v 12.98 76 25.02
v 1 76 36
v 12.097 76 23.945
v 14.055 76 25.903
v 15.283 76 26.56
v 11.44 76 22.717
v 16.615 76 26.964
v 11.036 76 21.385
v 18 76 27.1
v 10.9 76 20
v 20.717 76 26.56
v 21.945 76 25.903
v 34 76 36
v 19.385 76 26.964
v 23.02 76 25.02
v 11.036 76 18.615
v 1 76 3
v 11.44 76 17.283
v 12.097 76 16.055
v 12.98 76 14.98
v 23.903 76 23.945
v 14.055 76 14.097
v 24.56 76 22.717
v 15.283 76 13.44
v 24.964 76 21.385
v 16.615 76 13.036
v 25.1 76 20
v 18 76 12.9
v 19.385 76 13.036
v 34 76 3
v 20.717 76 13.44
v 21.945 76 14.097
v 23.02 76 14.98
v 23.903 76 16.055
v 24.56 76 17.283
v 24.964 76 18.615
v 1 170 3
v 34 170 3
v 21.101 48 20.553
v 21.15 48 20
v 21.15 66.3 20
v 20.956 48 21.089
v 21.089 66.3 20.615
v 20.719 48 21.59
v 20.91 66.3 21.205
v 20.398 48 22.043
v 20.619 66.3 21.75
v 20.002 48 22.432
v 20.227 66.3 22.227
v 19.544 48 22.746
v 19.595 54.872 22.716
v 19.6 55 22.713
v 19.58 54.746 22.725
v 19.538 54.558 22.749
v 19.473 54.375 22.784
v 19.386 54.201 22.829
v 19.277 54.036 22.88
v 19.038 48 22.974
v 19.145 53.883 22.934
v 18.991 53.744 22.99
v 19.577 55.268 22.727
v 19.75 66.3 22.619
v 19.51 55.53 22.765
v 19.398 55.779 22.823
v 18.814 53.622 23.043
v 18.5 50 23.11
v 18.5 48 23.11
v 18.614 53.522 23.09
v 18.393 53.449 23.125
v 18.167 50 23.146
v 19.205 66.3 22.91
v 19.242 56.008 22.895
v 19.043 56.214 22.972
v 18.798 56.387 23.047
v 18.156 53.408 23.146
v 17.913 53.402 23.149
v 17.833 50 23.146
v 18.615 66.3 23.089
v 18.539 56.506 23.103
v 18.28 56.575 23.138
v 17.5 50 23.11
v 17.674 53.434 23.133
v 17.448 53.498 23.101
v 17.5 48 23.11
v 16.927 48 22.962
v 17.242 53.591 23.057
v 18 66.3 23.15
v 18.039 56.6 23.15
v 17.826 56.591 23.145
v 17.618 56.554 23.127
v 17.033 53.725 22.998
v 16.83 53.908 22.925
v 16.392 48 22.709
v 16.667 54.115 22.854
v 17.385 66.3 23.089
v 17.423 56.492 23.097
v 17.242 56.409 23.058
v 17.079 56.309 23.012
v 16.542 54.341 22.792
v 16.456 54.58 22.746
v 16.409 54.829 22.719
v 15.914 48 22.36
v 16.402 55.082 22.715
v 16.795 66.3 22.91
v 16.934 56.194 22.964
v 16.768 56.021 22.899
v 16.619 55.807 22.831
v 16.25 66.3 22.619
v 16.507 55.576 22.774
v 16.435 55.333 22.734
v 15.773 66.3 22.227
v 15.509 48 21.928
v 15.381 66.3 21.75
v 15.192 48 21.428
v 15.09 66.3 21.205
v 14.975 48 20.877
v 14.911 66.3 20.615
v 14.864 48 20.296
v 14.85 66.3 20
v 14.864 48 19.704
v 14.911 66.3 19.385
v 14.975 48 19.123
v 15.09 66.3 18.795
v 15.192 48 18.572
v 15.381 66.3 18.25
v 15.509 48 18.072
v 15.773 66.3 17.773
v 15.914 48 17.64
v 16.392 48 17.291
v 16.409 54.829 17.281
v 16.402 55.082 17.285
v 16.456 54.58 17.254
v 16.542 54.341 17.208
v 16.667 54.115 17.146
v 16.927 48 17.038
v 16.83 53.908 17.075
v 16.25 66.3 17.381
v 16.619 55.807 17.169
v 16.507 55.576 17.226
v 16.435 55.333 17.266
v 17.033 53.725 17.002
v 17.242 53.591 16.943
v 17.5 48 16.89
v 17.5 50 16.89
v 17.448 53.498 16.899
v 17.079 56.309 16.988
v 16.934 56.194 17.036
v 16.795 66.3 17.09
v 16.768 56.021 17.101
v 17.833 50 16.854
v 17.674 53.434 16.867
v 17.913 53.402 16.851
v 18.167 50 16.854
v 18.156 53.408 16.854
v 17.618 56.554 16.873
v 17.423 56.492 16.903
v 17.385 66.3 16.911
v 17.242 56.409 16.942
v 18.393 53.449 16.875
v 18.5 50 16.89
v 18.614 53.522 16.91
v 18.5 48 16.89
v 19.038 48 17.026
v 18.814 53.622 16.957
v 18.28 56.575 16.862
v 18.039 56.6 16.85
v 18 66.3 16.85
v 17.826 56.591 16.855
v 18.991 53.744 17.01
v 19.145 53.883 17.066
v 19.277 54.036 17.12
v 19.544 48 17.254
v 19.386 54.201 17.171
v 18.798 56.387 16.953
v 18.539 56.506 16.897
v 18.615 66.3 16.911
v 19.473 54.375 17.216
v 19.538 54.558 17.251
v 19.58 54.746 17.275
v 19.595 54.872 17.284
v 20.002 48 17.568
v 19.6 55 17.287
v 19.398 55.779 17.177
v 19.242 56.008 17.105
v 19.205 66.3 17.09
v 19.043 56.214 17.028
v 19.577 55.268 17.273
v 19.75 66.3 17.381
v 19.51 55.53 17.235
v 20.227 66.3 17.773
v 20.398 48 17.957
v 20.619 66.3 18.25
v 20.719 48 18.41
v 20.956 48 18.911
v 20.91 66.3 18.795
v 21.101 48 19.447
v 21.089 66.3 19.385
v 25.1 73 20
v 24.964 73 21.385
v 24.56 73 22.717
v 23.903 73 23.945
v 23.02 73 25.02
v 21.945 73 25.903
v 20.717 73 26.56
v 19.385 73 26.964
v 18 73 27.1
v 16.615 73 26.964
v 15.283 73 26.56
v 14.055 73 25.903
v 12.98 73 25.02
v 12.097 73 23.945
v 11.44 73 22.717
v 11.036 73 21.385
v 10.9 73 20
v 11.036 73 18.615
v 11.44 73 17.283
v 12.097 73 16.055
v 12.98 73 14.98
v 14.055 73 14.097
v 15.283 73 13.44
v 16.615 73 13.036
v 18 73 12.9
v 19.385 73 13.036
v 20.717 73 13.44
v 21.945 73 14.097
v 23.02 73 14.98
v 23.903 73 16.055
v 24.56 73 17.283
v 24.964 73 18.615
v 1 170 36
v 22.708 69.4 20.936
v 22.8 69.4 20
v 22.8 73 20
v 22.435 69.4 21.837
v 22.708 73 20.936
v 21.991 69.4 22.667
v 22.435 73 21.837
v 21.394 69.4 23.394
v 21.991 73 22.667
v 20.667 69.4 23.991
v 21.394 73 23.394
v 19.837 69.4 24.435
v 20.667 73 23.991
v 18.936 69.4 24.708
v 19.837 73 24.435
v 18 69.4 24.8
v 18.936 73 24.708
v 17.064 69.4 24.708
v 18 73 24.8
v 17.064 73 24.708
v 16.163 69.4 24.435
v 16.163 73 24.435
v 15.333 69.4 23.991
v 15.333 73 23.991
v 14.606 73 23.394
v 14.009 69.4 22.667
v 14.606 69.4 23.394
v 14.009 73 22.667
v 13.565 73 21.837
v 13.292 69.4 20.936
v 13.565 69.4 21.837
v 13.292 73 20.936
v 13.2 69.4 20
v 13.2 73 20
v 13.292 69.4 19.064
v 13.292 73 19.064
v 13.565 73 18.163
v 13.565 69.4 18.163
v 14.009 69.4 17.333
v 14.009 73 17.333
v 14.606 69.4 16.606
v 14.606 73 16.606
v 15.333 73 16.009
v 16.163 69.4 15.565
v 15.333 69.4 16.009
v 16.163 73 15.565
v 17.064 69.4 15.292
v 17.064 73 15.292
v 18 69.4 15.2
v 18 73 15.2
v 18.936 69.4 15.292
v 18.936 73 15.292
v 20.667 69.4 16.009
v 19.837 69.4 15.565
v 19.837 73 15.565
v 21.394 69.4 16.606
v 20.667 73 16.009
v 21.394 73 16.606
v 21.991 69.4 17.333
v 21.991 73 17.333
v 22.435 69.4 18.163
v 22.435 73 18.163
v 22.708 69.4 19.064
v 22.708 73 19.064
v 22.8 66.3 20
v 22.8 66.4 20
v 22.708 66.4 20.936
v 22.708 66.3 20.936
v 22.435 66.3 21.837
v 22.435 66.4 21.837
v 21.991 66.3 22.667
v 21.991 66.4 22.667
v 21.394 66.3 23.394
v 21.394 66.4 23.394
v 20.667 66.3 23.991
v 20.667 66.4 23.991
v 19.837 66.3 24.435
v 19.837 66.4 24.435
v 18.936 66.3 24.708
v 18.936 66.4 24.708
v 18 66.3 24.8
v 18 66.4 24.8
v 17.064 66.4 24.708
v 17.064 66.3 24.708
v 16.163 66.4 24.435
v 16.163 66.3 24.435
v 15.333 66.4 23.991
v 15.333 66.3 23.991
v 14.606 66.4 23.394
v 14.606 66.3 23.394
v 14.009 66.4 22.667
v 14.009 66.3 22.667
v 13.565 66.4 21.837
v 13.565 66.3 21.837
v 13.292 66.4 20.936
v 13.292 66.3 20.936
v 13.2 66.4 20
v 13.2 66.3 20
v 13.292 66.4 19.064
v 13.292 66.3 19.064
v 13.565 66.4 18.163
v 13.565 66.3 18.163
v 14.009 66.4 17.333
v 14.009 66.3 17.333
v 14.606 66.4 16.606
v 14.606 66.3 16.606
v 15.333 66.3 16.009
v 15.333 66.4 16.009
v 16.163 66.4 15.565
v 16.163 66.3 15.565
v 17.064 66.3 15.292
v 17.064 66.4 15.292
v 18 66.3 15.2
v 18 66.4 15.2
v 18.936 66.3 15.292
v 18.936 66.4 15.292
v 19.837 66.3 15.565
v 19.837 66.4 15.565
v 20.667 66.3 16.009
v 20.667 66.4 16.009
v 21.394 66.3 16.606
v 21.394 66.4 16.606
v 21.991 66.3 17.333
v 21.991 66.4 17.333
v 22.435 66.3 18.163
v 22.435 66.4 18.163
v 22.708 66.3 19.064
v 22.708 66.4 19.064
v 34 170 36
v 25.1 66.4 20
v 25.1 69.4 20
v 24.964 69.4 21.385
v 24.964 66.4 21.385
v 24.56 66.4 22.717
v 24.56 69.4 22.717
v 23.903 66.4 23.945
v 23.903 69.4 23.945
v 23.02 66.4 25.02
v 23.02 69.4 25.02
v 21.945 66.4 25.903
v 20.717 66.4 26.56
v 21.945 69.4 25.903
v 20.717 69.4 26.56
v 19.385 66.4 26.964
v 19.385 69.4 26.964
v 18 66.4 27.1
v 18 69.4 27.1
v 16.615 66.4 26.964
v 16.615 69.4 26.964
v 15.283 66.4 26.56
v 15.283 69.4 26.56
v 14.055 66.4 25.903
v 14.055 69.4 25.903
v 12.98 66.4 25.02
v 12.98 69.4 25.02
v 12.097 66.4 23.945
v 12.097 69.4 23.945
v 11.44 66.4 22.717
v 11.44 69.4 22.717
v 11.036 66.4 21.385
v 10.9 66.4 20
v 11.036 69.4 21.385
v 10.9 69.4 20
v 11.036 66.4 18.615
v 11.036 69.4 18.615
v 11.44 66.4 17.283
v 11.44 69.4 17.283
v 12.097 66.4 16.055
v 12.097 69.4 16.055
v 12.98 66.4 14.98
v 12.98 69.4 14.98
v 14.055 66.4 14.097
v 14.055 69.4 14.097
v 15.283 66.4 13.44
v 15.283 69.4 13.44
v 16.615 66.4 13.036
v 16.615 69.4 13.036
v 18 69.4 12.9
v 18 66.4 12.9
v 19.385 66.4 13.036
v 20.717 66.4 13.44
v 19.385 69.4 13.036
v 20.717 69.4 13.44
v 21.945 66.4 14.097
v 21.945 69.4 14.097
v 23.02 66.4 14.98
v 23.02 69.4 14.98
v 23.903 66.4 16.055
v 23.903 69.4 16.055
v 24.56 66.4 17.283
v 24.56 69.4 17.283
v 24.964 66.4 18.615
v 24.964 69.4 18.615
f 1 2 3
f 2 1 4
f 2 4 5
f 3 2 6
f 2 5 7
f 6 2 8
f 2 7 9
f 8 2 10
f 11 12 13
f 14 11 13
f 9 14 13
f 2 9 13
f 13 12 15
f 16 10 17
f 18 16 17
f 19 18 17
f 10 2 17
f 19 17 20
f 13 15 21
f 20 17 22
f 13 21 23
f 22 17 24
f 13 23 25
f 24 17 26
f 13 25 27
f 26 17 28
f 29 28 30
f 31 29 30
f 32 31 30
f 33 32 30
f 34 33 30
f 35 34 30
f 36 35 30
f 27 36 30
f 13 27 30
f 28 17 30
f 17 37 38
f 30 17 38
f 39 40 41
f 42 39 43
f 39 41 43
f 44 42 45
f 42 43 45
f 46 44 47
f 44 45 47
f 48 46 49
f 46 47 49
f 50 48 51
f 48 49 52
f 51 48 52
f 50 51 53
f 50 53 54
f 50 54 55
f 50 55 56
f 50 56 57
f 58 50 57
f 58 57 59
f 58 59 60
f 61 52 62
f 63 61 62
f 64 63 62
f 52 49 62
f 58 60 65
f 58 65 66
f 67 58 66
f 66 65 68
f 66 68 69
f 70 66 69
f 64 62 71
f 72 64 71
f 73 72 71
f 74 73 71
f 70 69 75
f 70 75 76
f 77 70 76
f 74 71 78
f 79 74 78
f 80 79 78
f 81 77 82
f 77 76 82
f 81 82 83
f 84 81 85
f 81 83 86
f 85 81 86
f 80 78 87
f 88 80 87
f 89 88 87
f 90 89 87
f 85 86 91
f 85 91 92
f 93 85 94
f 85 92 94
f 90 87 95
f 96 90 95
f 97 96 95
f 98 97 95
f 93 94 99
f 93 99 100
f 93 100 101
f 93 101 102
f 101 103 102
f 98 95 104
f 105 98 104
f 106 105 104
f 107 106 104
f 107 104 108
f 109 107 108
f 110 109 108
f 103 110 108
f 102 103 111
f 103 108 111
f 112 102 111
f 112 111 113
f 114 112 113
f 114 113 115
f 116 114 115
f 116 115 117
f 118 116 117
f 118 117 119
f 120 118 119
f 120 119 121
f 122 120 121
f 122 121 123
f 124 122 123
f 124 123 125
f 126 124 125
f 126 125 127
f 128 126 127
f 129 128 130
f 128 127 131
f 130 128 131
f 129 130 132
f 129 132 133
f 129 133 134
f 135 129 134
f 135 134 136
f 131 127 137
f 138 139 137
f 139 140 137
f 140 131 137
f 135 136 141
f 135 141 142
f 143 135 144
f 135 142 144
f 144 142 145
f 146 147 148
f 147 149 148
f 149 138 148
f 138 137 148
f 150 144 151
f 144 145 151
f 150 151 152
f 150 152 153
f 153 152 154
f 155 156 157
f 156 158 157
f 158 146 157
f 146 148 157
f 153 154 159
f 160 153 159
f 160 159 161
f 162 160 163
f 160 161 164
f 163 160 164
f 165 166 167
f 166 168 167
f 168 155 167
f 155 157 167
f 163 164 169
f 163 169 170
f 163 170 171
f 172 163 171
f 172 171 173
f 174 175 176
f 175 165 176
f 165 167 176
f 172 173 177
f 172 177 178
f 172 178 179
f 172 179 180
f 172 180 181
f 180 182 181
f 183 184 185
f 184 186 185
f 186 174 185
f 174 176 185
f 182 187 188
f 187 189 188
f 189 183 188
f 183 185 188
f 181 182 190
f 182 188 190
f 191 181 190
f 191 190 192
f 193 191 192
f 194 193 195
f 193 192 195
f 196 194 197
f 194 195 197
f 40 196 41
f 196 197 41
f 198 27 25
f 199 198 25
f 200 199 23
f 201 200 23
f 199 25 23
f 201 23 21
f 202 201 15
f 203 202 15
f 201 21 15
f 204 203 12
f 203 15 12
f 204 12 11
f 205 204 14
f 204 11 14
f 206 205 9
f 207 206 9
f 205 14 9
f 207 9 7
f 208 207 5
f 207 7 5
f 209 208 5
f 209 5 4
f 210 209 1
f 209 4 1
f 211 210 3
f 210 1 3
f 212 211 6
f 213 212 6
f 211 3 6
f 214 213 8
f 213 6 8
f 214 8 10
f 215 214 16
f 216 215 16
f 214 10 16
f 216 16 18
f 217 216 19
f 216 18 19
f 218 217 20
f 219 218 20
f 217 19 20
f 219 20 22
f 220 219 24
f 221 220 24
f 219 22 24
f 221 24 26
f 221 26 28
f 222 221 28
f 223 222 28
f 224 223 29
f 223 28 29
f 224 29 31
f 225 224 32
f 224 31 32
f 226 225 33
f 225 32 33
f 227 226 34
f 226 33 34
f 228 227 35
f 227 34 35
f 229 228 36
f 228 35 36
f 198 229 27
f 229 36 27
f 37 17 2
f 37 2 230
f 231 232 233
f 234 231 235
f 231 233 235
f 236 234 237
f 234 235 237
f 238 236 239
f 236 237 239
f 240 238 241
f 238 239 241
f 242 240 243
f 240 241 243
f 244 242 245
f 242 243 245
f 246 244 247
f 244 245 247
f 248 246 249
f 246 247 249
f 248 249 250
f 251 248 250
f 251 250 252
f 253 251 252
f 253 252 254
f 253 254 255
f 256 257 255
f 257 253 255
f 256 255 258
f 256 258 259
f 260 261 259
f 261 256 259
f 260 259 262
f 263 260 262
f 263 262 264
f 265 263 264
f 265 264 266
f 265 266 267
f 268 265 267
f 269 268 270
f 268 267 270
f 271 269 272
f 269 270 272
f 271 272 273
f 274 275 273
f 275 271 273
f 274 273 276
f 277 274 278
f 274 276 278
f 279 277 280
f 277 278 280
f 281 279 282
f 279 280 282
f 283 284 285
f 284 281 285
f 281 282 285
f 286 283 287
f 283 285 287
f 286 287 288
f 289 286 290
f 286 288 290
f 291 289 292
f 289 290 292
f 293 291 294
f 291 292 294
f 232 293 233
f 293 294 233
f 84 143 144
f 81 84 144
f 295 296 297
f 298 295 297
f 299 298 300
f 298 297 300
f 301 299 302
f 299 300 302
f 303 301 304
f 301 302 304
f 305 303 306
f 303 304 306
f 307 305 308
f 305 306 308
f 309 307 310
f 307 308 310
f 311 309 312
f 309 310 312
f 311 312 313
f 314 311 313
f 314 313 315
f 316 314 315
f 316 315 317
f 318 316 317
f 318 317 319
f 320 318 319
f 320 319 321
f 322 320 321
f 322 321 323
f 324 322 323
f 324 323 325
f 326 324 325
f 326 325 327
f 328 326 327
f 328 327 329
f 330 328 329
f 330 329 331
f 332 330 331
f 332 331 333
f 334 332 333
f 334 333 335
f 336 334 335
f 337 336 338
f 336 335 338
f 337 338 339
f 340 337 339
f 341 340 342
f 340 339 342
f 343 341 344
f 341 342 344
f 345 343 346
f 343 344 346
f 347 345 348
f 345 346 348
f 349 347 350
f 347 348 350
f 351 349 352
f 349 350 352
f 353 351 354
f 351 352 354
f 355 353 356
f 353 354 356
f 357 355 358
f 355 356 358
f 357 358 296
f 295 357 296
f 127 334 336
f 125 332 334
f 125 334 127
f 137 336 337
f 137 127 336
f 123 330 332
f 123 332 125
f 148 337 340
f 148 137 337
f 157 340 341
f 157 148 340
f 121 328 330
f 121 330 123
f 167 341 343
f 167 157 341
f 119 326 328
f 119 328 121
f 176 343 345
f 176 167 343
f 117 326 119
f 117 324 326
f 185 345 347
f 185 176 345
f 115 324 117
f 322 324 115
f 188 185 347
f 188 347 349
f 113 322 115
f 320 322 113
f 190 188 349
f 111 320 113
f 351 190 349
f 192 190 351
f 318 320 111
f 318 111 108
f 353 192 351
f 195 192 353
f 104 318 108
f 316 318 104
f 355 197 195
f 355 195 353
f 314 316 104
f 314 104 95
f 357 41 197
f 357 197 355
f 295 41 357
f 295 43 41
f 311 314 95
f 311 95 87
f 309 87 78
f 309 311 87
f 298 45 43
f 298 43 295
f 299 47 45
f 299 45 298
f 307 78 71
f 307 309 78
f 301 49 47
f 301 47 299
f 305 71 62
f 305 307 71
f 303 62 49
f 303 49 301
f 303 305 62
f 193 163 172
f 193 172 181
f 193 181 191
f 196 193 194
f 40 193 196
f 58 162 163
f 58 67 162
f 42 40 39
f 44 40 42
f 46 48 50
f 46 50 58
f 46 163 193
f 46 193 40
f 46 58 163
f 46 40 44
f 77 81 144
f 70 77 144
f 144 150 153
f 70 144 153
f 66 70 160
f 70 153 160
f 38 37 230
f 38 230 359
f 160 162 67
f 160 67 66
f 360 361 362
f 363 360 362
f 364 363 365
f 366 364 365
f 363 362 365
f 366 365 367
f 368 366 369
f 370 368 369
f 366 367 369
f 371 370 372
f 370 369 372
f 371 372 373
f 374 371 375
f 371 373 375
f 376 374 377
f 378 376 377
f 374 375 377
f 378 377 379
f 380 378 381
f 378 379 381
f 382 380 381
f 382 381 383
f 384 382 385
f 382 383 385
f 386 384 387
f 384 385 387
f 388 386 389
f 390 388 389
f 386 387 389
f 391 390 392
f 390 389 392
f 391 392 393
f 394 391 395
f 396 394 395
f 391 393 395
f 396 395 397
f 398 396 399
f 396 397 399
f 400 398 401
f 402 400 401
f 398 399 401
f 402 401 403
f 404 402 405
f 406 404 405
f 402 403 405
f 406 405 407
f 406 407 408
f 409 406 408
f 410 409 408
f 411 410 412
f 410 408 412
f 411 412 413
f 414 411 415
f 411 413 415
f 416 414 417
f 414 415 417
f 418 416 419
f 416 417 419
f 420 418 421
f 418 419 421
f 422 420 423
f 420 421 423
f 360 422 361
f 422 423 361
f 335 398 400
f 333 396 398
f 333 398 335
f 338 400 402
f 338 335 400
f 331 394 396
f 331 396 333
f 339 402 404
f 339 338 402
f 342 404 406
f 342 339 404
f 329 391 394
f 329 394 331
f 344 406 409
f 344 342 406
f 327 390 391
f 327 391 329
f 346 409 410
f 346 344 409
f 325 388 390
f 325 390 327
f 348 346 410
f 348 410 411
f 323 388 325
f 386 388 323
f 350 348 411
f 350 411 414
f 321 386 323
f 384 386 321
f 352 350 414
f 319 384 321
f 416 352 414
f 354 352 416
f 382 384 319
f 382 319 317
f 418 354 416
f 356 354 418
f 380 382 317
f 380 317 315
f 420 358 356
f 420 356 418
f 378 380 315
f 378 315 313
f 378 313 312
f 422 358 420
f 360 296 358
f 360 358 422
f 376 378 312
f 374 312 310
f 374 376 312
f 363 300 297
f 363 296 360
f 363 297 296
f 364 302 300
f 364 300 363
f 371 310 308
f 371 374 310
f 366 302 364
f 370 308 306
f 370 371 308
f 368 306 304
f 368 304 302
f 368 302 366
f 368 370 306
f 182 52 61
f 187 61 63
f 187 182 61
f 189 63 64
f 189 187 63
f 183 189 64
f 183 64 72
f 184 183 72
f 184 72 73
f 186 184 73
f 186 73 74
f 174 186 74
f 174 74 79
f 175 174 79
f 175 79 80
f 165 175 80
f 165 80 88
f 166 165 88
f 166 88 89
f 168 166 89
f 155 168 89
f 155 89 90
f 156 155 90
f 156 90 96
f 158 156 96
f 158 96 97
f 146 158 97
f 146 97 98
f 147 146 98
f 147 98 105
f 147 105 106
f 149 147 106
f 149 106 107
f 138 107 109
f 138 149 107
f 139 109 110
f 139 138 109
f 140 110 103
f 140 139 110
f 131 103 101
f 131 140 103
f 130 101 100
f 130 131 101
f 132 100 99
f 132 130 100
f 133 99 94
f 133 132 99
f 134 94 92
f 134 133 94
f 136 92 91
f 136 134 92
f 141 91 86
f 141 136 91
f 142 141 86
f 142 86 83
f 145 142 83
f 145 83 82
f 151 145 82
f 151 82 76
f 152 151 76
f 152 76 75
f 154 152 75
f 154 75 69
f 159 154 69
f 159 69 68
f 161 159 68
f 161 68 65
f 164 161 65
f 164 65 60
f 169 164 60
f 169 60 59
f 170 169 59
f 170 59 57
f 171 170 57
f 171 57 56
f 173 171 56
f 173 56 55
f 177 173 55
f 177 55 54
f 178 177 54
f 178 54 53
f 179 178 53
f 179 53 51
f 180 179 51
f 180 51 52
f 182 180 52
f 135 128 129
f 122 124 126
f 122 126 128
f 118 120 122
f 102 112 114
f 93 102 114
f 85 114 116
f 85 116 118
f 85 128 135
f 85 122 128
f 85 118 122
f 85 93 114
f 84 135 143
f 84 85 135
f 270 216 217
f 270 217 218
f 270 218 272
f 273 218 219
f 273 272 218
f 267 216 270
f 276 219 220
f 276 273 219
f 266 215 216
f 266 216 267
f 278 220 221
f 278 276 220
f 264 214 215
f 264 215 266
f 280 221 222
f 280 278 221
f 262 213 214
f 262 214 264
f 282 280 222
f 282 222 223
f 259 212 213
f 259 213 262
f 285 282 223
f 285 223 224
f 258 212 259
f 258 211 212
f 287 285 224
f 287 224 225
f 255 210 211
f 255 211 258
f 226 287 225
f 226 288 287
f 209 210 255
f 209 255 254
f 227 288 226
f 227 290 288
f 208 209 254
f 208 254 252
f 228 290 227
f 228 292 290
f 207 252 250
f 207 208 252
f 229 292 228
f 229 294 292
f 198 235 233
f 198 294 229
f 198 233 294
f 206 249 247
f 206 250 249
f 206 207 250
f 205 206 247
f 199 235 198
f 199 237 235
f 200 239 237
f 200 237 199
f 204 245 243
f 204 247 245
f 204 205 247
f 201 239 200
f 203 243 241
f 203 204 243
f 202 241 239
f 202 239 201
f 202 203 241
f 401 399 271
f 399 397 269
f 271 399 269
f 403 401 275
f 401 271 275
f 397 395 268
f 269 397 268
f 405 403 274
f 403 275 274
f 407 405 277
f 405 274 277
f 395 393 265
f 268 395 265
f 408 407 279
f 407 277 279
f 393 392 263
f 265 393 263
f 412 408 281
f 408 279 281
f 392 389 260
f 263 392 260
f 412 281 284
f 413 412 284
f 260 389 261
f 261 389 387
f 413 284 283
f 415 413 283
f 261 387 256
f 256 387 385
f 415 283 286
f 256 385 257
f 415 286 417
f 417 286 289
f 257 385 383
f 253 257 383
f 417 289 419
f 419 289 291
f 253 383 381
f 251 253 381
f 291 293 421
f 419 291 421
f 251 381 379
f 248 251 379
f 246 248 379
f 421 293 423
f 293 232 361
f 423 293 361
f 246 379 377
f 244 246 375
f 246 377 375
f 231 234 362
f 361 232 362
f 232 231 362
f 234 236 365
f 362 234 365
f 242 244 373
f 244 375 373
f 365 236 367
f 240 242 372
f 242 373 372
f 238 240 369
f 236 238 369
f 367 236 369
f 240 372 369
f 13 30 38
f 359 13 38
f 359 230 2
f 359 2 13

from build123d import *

# Parameters (mm, degrees)
BOX001_W          = 1
BOX001_H          = 2
BOX001_DEPTH      = 6.4
CYLINDER003_R     = 1.6
CYLINDER003_DEPTH = 6.5
CYLINDER001_R     = 4.8
CYLINDER001_DEPTH = 6.7
CYLINDER002_R     = 3.15
CYLINDER002_DEPTH = 19
CYLINDER004_R     = 7.1
CYLINDER004_DEPTH = 3
CYLINDER_R        = 7.1
CYLINDER_DEPTH    = 3
BOX_W             = 33
BOX_H             = 94
BOX_DEPTH         = 33


with BuildPart() as slit001:
    # Box001 → Box001 (new body)
    with BuildSketch(Plane(origin=(17.5, 48, 16.8), x_dir=(1, 0, 0), z_dir=(0, 0, 1))):
        with Locations((0.5, 1)):
            Rectangle(BOX001_W, BOX001_H)
    extrude(amount=BOX001_DEPTH)


with BuildPart() as hole001:
    # Cylinder003 → Cylinder003 (new body)
    with BuildSketch(Plane(origin=(18, 55, 16.7), x_dir=(1, 0, 0), z_dir=(0, 0, 1))):
        Circle(CYLINDER003_R)
    extrude(amount=CYLINDER003_DEPTH)


with BuildPart() as shaft002:
    # Cylinder001 → Cylinder001 (new body)
    with BuildSketch(Plane(origin=(18, 73, 20), x_dir=(1, 0, 0), z_dir=(0, -1, 0))):
        Circle(CYLINDER001_R)
    extrude(amount=CYLINDER001_DEPTH)


with BuildPart() as shaft003:
    # Cylinder002 → Cylinder002 (new body)
    with BuildSketch(Plane(origin=(18, 67, 20), x_dir=(1, 0, 0), z_dir=(0, -1, 0))):
        Circle(CYLINDER002_R)
    extrude(amount=CYLINDER002_DEPTH)


with BuildPart() as shaft004:
    # Cylinder004 → Cylinder004 (new body)
    with BuildSketch(Plane(origin=(18, 69.4, 20), x_dir=(1, 0, 0), z_dir=(0, -1, 0))):
        Circle(CYLINDER004_R)
    extrude(amount=CYLINDER004_DEPTH)


with BuildPart() as wholeshaft001:
    # Cylinder → Cylinder (new body)
    with BuildSketch(Plane(origin=(18, 76, 20), x_dir=(1, 0, 0), z_dir=(0, -1, 0))):
        Circle(CYLINDER_R)
    extrude(amount=CYLINDER_DEPTH)

    # Fusion: union shaft002, shaft003, shaft004
    add(shaft002.part)
    add(shaft003.part)
    add(shaft004.part)

    # Cut: cut hole001
    add(hole001.part, mode=Mode.SUBTRACT)

    # Cut001: cut slit001
    add(slit001.part, mode=Mode.SUBTRACT)


with BuildPart() as wholeshaft001_1:
    # Cut001 placement: moved
    add(wholeshaft001.part.moved(Location((-1, 0, -3))))


with BuildPart() as cap001:
    # Box → Box (new body)
    with BuildSketch(Plane(origin=(0, 76, 0), x_dir=(1, 0, 0), z_dir=(0, 0, 1))):
        with Locations((16.5, 47)):
            Rectangle(BOX_W, BOX_H)
    extrude(amount=BOX_DEPTH)

    # Fusion001: union wholeShaft001
    add(wholeshaft001_1.part)


with BuildPart() as cap001_1:
    # Fusion001 placement: moved
    add(cap001.part.moved(Location((1, 0, 3))))


solid = cap001_1.part
